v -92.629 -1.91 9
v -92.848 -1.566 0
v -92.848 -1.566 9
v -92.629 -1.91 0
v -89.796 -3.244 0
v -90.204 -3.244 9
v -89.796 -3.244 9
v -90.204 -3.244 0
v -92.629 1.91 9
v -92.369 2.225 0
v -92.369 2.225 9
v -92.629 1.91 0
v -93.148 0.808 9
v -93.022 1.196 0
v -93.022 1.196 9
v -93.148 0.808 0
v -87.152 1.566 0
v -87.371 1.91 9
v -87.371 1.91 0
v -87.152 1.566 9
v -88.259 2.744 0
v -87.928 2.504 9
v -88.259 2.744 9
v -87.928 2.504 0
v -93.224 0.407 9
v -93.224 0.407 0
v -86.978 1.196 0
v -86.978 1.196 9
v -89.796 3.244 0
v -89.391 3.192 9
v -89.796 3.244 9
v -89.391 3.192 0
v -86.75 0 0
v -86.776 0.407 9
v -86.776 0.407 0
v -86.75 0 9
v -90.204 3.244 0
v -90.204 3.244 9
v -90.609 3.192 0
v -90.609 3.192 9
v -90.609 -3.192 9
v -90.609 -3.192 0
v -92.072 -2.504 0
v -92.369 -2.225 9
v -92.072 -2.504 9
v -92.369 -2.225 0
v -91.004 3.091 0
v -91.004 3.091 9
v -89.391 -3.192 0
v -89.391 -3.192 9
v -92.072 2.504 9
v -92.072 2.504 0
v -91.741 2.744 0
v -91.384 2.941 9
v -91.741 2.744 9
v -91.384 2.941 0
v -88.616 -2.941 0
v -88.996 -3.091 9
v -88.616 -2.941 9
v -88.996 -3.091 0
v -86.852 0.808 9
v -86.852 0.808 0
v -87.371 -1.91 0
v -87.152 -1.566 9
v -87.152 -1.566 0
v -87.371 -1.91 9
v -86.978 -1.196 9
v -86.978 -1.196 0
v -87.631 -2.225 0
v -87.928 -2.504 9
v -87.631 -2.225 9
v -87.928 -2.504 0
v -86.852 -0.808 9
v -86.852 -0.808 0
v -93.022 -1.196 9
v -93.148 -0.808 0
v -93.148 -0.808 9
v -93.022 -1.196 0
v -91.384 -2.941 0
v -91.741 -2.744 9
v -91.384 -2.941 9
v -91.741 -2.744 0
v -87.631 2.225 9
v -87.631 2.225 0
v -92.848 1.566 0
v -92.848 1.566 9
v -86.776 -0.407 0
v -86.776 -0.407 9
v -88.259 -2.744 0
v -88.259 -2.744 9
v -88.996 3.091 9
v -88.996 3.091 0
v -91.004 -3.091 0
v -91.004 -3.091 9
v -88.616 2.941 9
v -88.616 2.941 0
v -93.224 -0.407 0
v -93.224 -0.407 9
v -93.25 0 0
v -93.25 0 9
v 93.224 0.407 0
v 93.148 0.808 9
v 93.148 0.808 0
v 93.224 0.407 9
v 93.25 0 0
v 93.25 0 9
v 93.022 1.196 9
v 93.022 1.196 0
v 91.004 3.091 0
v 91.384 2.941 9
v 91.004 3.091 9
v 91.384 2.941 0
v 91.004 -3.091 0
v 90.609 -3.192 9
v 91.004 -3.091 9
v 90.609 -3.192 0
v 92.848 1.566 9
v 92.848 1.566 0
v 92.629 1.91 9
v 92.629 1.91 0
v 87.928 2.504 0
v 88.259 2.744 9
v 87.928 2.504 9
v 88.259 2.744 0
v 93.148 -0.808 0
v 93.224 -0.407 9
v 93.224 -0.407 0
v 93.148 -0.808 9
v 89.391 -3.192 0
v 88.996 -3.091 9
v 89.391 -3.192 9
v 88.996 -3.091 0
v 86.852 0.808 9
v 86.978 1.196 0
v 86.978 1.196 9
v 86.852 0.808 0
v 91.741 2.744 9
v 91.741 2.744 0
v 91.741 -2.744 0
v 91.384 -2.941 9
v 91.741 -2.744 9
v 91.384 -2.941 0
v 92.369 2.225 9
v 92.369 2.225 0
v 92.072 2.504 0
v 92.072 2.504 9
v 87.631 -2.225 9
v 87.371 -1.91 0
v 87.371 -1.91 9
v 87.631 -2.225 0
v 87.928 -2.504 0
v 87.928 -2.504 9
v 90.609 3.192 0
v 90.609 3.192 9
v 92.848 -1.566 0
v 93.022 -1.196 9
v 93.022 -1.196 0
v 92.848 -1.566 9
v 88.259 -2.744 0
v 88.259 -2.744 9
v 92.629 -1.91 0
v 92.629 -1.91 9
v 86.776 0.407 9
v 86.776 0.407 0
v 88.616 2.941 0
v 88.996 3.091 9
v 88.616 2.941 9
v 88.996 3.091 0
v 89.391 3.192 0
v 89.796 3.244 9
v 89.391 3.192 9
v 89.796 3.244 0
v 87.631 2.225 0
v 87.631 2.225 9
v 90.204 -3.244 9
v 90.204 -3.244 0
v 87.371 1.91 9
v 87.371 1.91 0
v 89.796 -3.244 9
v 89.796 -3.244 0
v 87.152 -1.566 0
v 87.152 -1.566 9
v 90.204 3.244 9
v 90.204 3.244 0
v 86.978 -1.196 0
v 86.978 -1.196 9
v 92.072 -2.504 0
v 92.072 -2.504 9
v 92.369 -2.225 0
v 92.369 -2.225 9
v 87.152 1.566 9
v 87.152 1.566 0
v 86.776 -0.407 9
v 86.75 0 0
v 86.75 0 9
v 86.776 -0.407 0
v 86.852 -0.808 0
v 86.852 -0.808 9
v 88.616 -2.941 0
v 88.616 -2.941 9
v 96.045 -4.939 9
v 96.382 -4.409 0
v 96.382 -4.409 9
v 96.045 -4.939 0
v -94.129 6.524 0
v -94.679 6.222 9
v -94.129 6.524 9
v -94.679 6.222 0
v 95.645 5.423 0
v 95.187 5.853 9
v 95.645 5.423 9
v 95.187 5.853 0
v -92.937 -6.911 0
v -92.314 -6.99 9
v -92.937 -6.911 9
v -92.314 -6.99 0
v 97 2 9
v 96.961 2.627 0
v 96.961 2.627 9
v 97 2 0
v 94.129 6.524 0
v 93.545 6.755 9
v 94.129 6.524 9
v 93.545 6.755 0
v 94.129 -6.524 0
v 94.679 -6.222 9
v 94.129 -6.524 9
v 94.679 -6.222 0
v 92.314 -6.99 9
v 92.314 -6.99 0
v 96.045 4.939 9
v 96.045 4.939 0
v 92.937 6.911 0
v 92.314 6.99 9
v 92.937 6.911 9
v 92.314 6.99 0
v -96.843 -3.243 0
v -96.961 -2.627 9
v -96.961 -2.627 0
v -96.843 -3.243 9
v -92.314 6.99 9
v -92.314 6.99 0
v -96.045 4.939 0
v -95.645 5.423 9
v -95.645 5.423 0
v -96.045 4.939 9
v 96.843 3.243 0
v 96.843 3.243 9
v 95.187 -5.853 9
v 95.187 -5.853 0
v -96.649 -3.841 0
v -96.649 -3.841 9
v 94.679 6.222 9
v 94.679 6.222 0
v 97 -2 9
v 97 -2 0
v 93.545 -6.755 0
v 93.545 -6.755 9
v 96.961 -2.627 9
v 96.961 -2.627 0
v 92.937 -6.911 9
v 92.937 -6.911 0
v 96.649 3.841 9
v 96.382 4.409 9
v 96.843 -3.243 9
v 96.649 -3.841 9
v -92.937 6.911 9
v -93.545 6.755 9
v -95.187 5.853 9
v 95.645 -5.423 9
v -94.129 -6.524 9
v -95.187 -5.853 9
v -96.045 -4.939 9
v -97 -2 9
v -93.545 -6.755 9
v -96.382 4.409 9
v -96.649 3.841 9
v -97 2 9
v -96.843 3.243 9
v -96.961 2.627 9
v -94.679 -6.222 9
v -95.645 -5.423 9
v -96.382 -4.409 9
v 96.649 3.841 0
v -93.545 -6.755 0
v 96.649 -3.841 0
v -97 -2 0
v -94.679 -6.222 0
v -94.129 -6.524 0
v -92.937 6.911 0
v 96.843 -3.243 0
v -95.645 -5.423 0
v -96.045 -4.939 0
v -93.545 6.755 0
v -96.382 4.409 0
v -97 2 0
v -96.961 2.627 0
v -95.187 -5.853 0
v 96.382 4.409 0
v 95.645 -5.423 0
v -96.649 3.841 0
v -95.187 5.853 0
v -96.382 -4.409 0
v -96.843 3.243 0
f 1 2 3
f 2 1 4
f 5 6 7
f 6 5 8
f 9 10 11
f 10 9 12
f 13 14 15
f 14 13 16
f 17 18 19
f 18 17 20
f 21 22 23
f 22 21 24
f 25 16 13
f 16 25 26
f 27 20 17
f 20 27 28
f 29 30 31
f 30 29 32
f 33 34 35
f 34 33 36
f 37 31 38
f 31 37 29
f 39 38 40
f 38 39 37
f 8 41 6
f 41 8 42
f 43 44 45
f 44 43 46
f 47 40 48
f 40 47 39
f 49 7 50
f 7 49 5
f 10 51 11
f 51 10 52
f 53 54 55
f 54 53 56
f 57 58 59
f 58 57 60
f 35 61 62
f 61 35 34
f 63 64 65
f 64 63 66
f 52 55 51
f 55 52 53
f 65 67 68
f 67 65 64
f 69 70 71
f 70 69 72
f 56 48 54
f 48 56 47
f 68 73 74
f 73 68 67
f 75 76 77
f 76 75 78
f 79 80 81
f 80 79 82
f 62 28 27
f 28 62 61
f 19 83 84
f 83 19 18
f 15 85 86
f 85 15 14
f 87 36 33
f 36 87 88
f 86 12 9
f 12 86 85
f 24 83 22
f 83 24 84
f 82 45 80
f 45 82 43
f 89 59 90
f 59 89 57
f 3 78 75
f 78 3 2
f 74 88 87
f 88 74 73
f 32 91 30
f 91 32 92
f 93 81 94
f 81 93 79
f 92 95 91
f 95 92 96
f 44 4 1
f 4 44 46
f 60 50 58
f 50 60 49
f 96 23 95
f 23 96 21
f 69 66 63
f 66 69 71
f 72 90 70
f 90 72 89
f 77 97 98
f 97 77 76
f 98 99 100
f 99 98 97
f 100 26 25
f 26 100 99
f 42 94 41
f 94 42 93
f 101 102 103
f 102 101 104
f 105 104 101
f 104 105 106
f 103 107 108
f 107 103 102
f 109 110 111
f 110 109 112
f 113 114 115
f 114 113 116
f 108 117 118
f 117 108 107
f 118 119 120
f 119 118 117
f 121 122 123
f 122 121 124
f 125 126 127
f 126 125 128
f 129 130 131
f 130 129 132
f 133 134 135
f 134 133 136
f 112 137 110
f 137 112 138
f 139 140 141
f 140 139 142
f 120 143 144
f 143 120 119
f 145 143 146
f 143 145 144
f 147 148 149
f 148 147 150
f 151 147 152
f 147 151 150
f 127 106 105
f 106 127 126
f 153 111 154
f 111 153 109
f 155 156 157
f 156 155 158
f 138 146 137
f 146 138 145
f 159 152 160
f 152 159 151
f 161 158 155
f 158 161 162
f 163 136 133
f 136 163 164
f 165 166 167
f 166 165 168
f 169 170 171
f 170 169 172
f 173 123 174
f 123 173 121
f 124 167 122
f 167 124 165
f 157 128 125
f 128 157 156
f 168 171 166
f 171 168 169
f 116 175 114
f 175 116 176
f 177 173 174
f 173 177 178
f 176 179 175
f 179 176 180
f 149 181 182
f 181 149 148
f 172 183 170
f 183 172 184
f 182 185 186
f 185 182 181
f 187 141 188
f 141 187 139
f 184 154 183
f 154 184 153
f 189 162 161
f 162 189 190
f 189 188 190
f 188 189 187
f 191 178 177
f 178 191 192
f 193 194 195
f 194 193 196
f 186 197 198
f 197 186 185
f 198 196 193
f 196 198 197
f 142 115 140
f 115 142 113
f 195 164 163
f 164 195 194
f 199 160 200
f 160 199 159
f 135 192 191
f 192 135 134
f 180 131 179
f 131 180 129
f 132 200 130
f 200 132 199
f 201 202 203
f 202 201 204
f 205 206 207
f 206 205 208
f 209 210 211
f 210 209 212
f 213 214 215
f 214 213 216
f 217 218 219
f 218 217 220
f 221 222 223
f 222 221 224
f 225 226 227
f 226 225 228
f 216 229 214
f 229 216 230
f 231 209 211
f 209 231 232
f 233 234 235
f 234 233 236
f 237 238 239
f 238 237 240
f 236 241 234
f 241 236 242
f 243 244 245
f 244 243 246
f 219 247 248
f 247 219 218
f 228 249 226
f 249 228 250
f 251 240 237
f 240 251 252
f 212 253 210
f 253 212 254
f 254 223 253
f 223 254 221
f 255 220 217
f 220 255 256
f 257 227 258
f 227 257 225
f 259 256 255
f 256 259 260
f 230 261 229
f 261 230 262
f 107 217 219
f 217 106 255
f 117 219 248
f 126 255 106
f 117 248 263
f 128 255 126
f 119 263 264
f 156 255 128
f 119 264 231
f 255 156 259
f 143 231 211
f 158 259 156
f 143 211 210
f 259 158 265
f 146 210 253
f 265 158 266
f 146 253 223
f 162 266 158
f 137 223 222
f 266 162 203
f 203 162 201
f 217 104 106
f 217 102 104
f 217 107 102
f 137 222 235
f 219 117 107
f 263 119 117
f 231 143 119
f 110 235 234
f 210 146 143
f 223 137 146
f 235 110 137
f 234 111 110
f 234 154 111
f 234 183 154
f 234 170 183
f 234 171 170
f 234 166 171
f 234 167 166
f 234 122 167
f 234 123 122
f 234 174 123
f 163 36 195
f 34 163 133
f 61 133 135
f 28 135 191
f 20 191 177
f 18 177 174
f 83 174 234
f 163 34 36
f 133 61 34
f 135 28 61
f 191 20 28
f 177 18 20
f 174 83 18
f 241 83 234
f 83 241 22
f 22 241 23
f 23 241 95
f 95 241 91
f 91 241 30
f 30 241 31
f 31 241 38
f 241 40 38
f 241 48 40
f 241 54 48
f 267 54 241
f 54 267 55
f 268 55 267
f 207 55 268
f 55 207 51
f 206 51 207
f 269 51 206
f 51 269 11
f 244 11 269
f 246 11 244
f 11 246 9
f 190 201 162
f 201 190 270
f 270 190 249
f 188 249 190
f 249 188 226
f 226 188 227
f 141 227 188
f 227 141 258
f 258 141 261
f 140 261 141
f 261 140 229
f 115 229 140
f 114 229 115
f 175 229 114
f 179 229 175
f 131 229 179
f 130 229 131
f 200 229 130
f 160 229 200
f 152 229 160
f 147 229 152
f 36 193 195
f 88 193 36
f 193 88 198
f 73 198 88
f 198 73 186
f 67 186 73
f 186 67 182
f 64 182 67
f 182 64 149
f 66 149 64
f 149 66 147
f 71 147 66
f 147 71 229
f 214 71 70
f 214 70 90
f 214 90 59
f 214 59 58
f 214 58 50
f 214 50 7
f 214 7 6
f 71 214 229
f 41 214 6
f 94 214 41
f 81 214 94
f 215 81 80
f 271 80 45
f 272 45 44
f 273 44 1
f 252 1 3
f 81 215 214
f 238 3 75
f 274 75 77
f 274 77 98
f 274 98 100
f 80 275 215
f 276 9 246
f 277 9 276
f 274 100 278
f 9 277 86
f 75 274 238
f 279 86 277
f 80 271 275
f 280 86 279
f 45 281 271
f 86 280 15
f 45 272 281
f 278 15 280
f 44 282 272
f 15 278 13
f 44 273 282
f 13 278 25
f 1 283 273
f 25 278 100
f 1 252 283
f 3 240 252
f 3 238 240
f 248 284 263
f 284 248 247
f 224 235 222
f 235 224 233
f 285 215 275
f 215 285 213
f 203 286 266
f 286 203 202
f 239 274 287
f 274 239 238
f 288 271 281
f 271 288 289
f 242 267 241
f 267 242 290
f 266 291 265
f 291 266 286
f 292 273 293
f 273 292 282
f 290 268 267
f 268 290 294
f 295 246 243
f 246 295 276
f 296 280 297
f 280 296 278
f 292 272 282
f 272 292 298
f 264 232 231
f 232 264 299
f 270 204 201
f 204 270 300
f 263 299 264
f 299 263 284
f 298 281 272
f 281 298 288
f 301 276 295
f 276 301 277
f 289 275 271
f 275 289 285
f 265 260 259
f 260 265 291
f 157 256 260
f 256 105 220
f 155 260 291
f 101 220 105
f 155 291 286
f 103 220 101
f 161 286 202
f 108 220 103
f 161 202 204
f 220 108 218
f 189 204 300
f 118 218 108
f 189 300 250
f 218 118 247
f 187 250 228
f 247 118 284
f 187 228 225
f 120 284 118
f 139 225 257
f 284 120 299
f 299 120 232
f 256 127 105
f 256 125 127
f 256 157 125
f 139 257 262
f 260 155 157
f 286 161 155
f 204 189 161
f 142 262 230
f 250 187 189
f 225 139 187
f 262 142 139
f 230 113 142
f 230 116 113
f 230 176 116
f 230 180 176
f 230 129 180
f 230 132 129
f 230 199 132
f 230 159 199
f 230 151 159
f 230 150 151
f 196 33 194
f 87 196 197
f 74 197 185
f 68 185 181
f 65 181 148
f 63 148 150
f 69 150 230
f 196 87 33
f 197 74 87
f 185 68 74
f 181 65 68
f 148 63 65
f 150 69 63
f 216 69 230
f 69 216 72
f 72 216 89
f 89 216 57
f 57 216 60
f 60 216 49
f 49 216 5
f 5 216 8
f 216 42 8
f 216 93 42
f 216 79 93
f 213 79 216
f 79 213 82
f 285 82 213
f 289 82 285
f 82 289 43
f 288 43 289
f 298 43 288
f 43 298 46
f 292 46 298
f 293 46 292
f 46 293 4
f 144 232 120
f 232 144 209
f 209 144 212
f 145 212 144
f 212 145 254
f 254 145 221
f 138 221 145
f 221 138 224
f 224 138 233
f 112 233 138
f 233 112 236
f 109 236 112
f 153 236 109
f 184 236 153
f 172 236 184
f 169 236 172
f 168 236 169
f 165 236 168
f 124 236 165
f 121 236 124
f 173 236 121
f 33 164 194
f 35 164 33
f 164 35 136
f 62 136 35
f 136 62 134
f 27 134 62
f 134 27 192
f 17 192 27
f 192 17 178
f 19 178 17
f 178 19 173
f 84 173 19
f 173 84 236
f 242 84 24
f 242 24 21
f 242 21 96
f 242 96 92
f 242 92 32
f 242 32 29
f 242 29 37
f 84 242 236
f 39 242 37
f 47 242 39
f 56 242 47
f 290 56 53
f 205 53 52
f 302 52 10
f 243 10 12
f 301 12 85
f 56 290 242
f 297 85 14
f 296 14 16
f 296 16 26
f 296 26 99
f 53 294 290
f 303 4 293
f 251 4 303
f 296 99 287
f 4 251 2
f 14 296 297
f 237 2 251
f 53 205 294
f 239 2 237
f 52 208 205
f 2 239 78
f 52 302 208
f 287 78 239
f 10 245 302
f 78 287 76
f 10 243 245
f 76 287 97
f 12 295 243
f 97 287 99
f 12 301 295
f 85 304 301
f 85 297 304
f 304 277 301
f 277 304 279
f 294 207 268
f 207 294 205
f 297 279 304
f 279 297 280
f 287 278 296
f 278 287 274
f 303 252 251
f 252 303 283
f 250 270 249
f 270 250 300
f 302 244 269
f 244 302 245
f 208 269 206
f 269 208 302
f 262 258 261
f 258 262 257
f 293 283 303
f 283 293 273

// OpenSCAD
$fn = 50;


difference() {
	union() {
		hull() {
			translate(v = [-92.0000000000, 2.0000000000, 0]) {
				cylinder(h = 9, r = 5);
			}
			translate(v = [92.0000000000, 2.0000000000, 0]) {
				cylinder(h = 9, r = 5);
			}
			translate(v = [-92.0000000000, -2.0000000000, 0]) {
				cylinder(h = 9, r = 5);
			}
			translate(v = [92.0000000000, -2.0000000000, 0]) {
				cylinder(h = 9, r = 5);
			}
		}
	}
	union() {
		translate(v = [-90.0000000000, 0.0000000000, -100.0000000000]) {
			cylinder(h = 200, r = 3.2500000000);
		}
		translate(v = [-90.0000000000, 0.0000000000, -100.0000000000]) {
			cylinder(h = 200, r = 3.2500000000);
		}
		translate(v = [90.0000000000, 0.0000000000, -100.0000000000]) {
			cylinder(h = 200, r = 3.2500000000);
		}
		translate(v = [90.0000000000, 0.0000000000, -100.0000000000]) {
			cylinder(h = 200, r = 3.2500000000);
		}
	}
}
